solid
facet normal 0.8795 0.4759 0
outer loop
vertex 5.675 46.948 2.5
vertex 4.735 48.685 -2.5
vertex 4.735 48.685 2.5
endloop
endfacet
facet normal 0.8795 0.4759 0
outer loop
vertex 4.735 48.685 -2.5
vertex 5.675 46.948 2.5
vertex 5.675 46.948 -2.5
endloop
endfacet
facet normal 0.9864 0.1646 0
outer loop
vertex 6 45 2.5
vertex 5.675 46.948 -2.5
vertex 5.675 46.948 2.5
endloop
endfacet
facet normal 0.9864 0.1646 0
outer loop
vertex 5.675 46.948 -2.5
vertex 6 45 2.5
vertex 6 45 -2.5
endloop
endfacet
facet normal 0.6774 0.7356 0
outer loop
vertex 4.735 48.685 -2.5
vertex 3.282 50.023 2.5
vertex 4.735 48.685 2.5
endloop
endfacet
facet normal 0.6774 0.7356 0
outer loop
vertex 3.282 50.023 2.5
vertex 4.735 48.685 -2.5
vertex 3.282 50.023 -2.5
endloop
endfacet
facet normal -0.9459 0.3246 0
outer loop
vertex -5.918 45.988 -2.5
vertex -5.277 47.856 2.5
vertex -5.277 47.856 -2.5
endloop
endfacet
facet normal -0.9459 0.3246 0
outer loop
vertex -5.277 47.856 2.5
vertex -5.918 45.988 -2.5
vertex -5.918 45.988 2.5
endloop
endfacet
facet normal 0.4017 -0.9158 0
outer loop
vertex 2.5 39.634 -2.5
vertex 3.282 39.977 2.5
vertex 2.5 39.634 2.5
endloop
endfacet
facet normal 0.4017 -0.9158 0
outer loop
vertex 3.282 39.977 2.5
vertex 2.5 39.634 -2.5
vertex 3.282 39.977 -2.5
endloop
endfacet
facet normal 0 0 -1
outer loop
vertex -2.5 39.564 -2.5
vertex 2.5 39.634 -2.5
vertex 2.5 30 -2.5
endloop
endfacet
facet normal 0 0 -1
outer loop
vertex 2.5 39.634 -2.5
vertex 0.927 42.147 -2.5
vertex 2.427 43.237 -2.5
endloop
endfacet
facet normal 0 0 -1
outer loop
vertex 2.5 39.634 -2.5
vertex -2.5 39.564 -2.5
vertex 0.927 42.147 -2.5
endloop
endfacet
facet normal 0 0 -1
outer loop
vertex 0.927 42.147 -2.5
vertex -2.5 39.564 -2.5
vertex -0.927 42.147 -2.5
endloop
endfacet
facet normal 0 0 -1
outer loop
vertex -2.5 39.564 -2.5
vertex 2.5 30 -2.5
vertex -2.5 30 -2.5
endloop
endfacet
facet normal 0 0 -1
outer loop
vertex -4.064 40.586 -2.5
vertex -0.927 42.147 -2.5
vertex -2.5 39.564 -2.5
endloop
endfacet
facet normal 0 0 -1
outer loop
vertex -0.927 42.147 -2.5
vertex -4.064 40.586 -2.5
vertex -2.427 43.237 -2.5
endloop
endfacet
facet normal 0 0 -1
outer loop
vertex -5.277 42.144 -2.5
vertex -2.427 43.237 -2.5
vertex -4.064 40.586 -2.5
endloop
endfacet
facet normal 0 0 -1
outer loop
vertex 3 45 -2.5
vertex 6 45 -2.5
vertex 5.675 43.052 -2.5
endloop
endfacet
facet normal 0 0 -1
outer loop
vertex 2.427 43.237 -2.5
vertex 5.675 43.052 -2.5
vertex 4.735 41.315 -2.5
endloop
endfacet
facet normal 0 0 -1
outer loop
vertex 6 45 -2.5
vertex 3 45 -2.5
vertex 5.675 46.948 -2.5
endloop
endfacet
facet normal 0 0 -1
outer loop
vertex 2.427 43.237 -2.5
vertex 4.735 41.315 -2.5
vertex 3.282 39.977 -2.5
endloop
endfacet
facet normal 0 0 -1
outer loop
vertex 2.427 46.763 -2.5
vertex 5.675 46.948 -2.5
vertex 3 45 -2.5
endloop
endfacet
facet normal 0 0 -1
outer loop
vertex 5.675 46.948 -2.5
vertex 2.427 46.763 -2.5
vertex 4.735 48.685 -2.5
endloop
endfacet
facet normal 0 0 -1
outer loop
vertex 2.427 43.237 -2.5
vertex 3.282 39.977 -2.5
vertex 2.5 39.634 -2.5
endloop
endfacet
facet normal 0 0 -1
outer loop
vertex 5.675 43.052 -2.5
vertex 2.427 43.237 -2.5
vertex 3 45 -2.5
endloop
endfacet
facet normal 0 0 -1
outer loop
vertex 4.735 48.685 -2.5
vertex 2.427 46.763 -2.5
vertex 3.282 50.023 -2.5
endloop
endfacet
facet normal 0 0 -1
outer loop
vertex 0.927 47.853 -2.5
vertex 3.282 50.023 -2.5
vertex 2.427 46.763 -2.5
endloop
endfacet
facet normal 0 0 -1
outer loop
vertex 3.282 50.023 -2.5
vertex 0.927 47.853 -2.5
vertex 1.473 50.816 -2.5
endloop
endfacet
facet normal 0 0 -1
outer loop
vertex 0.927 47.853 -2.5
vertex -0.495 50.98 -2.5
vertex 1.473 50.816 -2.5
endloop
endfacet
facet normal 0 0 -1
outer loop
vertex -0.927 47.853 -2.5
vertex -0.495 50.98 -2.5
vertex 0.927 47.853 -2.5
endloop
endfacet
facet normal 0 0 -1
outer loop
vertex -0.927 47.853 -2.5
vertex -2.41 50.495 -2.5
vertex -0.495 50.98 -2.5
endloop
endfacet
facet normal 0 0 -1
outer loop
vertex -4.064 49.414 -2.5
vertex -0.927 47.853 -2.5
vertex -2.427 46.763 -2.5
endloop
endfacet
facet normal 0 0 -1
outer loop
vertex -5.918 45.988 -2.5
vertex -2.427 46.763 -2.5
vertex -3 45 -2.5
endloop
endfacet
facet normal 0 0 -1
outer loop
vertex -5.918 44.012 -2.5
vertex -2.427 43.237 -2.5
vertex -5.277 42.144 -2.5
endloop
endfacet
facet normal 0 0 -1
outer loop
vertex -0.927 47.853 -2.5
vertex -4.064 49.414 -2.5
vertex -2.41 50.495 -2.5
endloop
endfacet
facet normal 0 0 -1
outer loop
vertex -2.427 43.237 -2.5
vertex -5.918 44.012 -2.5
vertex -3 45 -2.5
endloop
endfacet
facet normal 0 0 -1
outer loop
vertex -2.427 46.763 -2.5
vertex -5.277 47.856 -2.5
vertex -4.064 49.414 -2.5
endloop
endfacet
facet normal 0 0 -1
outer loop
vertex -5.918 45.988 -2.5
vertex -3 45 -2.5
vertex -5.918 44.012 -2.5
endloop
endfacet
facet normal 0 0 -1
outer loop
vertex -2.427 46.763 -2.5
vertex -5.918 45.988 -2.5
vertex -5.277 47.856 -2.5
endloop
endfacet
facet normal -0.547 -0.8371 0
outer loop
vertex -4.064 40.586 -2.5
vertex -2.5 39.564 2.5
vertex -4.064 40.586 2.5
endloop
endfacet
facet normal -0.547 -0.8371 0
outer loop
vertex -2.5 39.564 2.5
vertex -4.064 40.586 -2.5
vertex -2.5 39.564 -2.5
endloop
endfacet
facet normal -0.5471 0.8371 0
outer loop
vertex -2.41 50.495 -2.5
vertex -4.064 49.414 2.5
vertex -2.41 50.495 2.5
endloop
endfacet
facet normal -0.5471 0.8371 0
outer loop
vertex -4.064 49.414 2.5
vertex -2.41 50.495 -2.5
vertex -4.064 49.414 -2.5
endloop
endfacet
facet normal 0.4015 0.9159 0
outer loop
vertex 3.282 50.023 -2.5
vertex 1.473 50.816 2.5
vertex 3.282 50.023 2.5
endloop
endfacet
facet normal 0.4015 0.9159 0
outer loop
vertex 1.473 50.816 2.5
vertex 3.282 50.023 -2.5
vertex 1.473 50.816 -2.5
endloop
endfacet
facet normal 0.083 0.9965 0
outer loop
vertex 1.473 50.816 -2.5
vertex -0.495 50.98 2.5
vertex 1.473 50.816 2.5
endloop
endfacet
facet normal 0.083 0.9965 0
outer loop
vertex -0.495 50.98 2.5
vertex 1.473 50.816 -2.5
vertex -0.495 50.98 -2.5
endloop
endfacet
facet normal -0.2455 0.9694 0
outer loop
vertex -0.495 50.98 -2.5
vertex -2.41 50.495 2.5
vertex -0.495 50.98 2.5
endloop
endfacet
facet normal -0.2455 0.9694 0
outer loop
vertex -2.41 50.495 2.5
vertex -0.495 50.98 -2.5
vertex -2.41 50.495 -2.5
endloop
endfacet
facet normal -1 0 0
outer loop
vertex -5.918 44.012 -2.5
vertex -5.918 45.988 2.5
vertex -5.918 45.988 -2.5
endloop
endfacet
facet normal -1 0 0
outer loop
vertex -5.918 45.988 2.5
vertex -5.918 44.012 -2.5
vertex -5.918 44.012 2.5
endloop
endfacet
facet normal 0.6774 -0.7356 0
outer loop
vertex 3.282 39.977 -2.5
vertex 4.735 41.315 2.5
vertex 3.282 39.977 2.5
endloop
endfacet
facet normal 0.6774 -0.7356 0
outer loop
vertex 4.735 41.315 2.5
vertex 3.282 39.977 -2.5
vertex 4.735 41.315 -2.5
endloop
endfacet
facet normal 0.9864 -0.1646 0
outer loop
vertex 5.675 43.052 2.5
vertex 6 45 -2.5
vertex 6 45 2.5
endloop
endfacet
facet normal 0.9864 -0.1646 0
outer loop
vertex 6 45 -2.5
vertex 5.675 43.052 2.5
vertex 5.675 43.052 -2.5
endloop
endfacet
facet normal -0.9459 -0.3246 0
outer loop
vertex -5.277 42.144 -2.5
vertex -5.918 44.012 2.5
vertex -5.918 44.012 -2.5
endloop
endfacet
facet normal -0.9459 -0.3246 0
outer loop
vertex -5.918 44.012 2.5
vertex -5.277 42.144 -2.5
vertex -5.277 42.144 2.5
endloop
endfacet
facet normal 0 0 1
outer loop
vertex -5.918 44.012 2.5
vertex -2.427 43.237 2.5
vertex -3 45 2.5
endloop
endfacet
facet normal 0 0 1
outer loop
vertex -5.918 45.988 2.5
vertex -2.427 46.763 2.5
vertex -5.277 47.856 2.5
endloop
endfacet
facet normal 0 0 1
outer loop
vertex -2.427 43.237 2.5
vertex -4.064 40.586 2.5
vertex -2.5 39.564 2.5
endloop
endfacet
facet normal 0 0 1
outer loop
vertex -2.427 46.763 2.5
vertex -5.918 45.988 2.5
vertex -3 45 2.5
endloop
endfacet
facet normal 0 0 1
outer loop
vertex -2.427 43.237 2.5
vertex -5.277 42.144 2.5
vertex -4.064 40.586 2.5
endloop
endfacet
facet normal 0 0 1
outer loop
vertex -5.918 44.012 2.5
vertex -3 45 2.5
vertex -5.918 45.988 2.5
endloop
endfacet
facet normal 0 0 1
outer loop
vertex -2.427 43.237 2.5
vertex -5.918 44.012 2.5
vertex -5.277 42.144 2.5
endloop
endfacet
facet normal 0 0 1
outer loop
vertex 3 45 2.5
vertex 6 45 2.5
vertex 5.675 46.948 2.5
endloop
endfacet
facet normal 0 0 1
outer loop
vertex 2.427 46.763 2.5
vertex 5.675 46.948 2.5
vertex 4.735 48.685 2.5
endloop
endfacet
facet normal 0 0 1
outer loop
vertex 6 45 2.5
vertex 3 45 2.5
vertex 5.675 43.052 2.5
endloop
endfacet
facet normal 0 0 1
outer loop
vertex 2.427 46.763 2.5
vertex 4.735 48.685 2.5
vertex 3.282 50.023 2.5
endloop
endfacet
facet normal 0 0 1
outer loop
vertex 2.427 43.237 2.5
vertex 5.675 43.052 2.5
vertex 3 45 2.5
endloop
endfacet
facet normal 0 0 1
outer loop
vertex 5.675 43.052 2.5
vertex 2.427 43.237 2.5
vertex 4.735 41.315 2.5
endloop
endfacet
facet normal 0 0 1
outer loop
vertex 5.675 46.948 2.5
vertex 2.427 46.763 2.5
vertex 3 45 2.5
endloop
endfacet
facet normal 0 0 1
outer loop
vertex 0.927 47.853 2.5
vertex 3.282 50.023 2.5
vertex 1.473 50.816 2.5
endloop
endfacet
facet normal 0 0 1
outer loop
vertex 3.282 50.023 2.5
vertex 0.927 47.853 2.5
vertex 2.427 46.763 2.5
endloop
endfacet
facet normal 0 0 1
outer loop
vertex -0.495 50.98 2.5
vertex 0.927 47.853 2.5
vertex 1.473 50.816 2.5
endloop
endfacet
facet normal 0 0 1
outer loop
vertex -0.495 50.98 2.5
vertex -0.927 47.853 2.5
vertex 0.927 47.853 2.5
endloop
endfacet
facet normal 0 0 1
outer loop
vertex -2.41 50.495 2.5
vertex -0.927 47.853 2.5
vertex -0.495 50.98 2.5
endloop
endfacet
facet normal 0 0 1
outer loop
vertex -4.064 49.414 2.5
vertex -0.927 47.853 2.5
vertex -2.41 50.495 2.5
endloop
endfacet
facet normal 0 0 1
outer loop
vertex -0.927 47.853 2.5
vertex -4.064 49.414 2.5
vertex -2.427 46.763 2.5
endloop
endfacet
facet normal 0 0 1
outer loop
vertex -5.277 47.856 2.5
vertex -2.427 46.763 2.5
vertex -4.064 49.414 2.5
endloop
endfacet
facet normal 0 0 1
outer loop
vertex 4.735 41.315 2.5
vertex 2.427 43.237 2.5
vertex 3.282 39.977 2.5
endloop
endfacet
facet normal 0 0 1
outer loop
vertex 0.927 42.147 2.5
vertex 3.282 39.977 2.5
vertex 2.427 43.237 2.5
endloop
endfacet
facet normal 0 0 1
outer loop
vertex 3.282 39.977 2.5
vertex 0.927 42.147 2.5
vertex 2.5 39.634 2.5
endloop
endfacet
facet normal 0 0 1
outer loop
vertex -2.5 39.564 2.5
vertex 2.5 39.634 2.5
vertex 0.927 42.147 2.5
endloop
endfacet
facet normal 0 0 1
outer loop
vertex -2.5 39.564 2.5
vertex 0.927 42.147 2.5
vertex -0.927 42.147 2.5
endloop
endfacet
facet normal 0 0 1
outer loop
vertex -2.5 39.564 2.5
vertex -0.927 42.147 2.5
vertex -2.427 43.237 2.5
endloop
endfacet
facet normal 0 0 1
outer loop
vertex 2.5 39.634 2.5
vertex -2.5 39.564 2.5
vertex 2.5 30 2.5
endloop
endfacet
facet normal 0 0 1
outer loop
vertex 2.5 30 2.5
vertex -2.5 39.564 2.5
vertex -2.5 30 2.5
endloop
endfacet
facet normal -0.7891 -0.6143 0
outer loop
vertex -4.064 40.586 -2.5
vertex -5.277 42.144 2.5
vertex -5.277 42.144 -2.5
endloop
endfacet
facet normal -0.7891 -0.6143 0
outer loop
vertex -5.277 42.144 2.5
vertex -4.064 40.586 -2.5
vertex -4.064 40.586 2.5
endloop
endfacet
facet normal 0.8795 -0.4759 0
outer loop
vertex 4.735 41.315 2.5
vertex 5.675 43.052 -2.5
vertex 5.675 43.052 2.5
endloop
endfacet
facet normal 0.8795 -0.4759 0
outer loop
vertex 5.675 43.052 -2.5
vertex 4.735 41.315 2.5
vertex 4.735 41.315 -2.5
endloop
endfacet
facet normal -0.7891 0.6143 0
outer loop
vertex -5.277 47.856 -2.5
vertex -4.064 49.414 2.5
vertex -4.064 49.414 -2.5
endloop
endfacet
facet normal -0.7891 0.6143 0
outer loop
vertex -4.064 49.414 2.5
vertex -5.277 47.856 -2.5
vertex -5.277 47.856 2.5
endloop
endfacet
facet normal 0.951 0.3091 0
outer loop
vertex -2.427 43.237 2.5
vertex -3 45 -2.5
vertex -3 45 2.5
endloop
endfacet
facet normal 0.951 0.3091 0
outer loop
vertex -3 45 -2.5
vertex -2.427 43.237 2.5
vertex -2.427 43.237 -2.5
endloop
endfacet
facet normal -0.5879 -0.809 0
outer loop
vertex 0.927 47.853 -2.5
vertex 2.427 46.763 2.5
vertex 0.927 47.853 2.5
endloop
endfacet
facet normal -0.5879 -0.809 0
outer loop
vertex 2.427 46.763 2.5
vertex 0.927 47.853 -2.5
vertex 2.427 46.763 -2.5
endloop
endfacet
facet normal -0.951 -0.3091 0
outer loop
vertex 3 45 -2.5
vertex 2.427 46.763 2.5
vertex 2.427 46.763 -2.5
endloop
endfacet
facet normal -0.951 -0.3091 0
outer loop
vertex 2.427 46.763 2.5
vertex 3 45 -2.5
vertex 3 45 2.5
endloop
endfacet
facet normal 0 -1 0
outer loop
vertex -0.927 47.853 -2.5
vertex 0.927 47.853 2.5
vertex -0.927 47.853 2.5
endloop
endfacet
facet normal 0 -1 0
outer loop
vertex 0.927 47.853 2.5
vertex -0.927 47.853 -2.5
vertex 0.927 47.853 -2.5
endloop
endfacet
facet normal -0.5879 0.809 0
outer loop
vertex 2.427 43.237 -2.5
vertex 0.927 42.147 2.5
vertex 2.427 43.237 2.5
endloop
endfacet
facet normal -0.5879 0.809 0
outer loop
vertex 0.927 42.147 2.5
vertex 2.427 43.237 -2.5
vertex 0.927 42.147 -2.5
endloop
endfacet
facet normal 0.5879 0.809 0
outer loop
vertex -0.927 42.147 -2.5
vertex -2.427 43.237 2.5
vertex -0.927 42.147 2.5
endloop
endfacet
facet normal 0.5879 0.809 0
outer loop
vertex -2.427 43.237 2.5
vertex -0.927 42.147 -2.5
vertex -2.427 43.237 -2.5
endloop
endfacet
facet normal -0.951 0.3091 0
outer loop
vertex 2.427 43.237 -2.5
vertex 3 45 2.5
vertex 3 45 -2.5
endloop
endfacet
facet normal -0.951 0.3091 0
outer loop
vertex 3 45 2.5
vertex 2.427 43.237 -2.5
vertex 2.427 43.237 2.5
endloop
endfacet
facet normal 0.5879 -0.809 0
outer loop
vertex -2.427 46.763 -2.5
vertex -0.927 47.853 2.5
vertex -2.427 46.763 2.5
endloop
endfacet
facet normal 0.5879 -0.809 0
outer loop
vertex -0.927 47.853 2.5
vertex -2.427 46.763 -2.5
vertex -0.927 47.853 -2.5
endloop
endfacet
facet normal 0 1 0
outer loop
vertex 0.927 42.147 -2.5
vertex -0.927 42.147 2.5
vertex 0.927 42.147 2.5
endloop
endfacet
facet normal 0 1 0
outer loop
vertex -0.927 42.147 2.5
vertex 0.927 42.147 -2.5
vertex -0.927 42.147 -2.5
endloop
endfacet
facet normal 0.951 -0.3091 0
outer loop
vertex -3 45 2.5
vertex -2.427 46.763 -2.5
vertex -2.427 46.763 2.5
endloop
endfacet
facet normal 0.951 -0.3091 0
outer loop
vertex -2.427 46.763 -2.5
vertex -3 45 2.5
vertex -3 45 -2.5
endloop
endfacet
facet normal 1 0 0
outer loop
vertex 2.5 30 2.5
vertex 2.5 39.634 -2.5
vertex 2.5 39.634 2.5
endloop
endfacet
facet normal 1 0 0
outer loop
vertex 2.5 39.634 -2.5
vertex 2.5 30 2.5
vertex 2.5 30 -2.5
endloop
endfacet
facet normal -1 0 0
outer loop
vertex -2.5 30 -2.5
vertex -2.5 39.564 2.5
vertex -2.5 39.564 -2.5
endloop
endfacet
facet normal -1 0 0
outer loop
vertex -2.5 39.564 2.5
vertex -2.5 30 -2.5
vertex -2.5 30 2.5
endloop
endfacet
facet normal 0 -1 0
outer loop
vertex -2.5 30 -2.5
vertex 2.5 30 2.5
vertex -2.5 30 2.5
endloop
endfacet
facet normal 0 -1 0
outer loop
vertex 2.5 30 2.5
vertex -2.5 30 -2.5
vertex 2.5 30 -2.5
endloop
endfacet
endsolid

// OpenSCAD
h = 5;
filename = "westie.dxf";
scale = 0.28;

module feature(){
		translate([4,30,0])scale([scale,scale,1])translate([0,0,-h/2])linear_extrude(height = h) import(filename);
}

module six_feature(){
	union() {
		for(i = [0:360 / 6:360]){
			rotate([0,0,i]) feature();
		}
	}
}

module base(){
	scale([0.7,0.7,1])
	translate([0,0,-h/2])linear_extrude(height = h) import("snowflake.dxf");
}


module loop() {
	translate([0,45,0]) {
		union(){
			difference() {
				cylinder(h,6,6, center = true);
				cylinder(h,3,3, center = true);
			}
			translate([0,-10,0])cube([5,10,5], center = true);
		}
	}
}


union() {
	six_feature();
	base();
	loop();
}

//translate([0,0,-5]) color([0,1,0]) cylinder(h,40,40);
